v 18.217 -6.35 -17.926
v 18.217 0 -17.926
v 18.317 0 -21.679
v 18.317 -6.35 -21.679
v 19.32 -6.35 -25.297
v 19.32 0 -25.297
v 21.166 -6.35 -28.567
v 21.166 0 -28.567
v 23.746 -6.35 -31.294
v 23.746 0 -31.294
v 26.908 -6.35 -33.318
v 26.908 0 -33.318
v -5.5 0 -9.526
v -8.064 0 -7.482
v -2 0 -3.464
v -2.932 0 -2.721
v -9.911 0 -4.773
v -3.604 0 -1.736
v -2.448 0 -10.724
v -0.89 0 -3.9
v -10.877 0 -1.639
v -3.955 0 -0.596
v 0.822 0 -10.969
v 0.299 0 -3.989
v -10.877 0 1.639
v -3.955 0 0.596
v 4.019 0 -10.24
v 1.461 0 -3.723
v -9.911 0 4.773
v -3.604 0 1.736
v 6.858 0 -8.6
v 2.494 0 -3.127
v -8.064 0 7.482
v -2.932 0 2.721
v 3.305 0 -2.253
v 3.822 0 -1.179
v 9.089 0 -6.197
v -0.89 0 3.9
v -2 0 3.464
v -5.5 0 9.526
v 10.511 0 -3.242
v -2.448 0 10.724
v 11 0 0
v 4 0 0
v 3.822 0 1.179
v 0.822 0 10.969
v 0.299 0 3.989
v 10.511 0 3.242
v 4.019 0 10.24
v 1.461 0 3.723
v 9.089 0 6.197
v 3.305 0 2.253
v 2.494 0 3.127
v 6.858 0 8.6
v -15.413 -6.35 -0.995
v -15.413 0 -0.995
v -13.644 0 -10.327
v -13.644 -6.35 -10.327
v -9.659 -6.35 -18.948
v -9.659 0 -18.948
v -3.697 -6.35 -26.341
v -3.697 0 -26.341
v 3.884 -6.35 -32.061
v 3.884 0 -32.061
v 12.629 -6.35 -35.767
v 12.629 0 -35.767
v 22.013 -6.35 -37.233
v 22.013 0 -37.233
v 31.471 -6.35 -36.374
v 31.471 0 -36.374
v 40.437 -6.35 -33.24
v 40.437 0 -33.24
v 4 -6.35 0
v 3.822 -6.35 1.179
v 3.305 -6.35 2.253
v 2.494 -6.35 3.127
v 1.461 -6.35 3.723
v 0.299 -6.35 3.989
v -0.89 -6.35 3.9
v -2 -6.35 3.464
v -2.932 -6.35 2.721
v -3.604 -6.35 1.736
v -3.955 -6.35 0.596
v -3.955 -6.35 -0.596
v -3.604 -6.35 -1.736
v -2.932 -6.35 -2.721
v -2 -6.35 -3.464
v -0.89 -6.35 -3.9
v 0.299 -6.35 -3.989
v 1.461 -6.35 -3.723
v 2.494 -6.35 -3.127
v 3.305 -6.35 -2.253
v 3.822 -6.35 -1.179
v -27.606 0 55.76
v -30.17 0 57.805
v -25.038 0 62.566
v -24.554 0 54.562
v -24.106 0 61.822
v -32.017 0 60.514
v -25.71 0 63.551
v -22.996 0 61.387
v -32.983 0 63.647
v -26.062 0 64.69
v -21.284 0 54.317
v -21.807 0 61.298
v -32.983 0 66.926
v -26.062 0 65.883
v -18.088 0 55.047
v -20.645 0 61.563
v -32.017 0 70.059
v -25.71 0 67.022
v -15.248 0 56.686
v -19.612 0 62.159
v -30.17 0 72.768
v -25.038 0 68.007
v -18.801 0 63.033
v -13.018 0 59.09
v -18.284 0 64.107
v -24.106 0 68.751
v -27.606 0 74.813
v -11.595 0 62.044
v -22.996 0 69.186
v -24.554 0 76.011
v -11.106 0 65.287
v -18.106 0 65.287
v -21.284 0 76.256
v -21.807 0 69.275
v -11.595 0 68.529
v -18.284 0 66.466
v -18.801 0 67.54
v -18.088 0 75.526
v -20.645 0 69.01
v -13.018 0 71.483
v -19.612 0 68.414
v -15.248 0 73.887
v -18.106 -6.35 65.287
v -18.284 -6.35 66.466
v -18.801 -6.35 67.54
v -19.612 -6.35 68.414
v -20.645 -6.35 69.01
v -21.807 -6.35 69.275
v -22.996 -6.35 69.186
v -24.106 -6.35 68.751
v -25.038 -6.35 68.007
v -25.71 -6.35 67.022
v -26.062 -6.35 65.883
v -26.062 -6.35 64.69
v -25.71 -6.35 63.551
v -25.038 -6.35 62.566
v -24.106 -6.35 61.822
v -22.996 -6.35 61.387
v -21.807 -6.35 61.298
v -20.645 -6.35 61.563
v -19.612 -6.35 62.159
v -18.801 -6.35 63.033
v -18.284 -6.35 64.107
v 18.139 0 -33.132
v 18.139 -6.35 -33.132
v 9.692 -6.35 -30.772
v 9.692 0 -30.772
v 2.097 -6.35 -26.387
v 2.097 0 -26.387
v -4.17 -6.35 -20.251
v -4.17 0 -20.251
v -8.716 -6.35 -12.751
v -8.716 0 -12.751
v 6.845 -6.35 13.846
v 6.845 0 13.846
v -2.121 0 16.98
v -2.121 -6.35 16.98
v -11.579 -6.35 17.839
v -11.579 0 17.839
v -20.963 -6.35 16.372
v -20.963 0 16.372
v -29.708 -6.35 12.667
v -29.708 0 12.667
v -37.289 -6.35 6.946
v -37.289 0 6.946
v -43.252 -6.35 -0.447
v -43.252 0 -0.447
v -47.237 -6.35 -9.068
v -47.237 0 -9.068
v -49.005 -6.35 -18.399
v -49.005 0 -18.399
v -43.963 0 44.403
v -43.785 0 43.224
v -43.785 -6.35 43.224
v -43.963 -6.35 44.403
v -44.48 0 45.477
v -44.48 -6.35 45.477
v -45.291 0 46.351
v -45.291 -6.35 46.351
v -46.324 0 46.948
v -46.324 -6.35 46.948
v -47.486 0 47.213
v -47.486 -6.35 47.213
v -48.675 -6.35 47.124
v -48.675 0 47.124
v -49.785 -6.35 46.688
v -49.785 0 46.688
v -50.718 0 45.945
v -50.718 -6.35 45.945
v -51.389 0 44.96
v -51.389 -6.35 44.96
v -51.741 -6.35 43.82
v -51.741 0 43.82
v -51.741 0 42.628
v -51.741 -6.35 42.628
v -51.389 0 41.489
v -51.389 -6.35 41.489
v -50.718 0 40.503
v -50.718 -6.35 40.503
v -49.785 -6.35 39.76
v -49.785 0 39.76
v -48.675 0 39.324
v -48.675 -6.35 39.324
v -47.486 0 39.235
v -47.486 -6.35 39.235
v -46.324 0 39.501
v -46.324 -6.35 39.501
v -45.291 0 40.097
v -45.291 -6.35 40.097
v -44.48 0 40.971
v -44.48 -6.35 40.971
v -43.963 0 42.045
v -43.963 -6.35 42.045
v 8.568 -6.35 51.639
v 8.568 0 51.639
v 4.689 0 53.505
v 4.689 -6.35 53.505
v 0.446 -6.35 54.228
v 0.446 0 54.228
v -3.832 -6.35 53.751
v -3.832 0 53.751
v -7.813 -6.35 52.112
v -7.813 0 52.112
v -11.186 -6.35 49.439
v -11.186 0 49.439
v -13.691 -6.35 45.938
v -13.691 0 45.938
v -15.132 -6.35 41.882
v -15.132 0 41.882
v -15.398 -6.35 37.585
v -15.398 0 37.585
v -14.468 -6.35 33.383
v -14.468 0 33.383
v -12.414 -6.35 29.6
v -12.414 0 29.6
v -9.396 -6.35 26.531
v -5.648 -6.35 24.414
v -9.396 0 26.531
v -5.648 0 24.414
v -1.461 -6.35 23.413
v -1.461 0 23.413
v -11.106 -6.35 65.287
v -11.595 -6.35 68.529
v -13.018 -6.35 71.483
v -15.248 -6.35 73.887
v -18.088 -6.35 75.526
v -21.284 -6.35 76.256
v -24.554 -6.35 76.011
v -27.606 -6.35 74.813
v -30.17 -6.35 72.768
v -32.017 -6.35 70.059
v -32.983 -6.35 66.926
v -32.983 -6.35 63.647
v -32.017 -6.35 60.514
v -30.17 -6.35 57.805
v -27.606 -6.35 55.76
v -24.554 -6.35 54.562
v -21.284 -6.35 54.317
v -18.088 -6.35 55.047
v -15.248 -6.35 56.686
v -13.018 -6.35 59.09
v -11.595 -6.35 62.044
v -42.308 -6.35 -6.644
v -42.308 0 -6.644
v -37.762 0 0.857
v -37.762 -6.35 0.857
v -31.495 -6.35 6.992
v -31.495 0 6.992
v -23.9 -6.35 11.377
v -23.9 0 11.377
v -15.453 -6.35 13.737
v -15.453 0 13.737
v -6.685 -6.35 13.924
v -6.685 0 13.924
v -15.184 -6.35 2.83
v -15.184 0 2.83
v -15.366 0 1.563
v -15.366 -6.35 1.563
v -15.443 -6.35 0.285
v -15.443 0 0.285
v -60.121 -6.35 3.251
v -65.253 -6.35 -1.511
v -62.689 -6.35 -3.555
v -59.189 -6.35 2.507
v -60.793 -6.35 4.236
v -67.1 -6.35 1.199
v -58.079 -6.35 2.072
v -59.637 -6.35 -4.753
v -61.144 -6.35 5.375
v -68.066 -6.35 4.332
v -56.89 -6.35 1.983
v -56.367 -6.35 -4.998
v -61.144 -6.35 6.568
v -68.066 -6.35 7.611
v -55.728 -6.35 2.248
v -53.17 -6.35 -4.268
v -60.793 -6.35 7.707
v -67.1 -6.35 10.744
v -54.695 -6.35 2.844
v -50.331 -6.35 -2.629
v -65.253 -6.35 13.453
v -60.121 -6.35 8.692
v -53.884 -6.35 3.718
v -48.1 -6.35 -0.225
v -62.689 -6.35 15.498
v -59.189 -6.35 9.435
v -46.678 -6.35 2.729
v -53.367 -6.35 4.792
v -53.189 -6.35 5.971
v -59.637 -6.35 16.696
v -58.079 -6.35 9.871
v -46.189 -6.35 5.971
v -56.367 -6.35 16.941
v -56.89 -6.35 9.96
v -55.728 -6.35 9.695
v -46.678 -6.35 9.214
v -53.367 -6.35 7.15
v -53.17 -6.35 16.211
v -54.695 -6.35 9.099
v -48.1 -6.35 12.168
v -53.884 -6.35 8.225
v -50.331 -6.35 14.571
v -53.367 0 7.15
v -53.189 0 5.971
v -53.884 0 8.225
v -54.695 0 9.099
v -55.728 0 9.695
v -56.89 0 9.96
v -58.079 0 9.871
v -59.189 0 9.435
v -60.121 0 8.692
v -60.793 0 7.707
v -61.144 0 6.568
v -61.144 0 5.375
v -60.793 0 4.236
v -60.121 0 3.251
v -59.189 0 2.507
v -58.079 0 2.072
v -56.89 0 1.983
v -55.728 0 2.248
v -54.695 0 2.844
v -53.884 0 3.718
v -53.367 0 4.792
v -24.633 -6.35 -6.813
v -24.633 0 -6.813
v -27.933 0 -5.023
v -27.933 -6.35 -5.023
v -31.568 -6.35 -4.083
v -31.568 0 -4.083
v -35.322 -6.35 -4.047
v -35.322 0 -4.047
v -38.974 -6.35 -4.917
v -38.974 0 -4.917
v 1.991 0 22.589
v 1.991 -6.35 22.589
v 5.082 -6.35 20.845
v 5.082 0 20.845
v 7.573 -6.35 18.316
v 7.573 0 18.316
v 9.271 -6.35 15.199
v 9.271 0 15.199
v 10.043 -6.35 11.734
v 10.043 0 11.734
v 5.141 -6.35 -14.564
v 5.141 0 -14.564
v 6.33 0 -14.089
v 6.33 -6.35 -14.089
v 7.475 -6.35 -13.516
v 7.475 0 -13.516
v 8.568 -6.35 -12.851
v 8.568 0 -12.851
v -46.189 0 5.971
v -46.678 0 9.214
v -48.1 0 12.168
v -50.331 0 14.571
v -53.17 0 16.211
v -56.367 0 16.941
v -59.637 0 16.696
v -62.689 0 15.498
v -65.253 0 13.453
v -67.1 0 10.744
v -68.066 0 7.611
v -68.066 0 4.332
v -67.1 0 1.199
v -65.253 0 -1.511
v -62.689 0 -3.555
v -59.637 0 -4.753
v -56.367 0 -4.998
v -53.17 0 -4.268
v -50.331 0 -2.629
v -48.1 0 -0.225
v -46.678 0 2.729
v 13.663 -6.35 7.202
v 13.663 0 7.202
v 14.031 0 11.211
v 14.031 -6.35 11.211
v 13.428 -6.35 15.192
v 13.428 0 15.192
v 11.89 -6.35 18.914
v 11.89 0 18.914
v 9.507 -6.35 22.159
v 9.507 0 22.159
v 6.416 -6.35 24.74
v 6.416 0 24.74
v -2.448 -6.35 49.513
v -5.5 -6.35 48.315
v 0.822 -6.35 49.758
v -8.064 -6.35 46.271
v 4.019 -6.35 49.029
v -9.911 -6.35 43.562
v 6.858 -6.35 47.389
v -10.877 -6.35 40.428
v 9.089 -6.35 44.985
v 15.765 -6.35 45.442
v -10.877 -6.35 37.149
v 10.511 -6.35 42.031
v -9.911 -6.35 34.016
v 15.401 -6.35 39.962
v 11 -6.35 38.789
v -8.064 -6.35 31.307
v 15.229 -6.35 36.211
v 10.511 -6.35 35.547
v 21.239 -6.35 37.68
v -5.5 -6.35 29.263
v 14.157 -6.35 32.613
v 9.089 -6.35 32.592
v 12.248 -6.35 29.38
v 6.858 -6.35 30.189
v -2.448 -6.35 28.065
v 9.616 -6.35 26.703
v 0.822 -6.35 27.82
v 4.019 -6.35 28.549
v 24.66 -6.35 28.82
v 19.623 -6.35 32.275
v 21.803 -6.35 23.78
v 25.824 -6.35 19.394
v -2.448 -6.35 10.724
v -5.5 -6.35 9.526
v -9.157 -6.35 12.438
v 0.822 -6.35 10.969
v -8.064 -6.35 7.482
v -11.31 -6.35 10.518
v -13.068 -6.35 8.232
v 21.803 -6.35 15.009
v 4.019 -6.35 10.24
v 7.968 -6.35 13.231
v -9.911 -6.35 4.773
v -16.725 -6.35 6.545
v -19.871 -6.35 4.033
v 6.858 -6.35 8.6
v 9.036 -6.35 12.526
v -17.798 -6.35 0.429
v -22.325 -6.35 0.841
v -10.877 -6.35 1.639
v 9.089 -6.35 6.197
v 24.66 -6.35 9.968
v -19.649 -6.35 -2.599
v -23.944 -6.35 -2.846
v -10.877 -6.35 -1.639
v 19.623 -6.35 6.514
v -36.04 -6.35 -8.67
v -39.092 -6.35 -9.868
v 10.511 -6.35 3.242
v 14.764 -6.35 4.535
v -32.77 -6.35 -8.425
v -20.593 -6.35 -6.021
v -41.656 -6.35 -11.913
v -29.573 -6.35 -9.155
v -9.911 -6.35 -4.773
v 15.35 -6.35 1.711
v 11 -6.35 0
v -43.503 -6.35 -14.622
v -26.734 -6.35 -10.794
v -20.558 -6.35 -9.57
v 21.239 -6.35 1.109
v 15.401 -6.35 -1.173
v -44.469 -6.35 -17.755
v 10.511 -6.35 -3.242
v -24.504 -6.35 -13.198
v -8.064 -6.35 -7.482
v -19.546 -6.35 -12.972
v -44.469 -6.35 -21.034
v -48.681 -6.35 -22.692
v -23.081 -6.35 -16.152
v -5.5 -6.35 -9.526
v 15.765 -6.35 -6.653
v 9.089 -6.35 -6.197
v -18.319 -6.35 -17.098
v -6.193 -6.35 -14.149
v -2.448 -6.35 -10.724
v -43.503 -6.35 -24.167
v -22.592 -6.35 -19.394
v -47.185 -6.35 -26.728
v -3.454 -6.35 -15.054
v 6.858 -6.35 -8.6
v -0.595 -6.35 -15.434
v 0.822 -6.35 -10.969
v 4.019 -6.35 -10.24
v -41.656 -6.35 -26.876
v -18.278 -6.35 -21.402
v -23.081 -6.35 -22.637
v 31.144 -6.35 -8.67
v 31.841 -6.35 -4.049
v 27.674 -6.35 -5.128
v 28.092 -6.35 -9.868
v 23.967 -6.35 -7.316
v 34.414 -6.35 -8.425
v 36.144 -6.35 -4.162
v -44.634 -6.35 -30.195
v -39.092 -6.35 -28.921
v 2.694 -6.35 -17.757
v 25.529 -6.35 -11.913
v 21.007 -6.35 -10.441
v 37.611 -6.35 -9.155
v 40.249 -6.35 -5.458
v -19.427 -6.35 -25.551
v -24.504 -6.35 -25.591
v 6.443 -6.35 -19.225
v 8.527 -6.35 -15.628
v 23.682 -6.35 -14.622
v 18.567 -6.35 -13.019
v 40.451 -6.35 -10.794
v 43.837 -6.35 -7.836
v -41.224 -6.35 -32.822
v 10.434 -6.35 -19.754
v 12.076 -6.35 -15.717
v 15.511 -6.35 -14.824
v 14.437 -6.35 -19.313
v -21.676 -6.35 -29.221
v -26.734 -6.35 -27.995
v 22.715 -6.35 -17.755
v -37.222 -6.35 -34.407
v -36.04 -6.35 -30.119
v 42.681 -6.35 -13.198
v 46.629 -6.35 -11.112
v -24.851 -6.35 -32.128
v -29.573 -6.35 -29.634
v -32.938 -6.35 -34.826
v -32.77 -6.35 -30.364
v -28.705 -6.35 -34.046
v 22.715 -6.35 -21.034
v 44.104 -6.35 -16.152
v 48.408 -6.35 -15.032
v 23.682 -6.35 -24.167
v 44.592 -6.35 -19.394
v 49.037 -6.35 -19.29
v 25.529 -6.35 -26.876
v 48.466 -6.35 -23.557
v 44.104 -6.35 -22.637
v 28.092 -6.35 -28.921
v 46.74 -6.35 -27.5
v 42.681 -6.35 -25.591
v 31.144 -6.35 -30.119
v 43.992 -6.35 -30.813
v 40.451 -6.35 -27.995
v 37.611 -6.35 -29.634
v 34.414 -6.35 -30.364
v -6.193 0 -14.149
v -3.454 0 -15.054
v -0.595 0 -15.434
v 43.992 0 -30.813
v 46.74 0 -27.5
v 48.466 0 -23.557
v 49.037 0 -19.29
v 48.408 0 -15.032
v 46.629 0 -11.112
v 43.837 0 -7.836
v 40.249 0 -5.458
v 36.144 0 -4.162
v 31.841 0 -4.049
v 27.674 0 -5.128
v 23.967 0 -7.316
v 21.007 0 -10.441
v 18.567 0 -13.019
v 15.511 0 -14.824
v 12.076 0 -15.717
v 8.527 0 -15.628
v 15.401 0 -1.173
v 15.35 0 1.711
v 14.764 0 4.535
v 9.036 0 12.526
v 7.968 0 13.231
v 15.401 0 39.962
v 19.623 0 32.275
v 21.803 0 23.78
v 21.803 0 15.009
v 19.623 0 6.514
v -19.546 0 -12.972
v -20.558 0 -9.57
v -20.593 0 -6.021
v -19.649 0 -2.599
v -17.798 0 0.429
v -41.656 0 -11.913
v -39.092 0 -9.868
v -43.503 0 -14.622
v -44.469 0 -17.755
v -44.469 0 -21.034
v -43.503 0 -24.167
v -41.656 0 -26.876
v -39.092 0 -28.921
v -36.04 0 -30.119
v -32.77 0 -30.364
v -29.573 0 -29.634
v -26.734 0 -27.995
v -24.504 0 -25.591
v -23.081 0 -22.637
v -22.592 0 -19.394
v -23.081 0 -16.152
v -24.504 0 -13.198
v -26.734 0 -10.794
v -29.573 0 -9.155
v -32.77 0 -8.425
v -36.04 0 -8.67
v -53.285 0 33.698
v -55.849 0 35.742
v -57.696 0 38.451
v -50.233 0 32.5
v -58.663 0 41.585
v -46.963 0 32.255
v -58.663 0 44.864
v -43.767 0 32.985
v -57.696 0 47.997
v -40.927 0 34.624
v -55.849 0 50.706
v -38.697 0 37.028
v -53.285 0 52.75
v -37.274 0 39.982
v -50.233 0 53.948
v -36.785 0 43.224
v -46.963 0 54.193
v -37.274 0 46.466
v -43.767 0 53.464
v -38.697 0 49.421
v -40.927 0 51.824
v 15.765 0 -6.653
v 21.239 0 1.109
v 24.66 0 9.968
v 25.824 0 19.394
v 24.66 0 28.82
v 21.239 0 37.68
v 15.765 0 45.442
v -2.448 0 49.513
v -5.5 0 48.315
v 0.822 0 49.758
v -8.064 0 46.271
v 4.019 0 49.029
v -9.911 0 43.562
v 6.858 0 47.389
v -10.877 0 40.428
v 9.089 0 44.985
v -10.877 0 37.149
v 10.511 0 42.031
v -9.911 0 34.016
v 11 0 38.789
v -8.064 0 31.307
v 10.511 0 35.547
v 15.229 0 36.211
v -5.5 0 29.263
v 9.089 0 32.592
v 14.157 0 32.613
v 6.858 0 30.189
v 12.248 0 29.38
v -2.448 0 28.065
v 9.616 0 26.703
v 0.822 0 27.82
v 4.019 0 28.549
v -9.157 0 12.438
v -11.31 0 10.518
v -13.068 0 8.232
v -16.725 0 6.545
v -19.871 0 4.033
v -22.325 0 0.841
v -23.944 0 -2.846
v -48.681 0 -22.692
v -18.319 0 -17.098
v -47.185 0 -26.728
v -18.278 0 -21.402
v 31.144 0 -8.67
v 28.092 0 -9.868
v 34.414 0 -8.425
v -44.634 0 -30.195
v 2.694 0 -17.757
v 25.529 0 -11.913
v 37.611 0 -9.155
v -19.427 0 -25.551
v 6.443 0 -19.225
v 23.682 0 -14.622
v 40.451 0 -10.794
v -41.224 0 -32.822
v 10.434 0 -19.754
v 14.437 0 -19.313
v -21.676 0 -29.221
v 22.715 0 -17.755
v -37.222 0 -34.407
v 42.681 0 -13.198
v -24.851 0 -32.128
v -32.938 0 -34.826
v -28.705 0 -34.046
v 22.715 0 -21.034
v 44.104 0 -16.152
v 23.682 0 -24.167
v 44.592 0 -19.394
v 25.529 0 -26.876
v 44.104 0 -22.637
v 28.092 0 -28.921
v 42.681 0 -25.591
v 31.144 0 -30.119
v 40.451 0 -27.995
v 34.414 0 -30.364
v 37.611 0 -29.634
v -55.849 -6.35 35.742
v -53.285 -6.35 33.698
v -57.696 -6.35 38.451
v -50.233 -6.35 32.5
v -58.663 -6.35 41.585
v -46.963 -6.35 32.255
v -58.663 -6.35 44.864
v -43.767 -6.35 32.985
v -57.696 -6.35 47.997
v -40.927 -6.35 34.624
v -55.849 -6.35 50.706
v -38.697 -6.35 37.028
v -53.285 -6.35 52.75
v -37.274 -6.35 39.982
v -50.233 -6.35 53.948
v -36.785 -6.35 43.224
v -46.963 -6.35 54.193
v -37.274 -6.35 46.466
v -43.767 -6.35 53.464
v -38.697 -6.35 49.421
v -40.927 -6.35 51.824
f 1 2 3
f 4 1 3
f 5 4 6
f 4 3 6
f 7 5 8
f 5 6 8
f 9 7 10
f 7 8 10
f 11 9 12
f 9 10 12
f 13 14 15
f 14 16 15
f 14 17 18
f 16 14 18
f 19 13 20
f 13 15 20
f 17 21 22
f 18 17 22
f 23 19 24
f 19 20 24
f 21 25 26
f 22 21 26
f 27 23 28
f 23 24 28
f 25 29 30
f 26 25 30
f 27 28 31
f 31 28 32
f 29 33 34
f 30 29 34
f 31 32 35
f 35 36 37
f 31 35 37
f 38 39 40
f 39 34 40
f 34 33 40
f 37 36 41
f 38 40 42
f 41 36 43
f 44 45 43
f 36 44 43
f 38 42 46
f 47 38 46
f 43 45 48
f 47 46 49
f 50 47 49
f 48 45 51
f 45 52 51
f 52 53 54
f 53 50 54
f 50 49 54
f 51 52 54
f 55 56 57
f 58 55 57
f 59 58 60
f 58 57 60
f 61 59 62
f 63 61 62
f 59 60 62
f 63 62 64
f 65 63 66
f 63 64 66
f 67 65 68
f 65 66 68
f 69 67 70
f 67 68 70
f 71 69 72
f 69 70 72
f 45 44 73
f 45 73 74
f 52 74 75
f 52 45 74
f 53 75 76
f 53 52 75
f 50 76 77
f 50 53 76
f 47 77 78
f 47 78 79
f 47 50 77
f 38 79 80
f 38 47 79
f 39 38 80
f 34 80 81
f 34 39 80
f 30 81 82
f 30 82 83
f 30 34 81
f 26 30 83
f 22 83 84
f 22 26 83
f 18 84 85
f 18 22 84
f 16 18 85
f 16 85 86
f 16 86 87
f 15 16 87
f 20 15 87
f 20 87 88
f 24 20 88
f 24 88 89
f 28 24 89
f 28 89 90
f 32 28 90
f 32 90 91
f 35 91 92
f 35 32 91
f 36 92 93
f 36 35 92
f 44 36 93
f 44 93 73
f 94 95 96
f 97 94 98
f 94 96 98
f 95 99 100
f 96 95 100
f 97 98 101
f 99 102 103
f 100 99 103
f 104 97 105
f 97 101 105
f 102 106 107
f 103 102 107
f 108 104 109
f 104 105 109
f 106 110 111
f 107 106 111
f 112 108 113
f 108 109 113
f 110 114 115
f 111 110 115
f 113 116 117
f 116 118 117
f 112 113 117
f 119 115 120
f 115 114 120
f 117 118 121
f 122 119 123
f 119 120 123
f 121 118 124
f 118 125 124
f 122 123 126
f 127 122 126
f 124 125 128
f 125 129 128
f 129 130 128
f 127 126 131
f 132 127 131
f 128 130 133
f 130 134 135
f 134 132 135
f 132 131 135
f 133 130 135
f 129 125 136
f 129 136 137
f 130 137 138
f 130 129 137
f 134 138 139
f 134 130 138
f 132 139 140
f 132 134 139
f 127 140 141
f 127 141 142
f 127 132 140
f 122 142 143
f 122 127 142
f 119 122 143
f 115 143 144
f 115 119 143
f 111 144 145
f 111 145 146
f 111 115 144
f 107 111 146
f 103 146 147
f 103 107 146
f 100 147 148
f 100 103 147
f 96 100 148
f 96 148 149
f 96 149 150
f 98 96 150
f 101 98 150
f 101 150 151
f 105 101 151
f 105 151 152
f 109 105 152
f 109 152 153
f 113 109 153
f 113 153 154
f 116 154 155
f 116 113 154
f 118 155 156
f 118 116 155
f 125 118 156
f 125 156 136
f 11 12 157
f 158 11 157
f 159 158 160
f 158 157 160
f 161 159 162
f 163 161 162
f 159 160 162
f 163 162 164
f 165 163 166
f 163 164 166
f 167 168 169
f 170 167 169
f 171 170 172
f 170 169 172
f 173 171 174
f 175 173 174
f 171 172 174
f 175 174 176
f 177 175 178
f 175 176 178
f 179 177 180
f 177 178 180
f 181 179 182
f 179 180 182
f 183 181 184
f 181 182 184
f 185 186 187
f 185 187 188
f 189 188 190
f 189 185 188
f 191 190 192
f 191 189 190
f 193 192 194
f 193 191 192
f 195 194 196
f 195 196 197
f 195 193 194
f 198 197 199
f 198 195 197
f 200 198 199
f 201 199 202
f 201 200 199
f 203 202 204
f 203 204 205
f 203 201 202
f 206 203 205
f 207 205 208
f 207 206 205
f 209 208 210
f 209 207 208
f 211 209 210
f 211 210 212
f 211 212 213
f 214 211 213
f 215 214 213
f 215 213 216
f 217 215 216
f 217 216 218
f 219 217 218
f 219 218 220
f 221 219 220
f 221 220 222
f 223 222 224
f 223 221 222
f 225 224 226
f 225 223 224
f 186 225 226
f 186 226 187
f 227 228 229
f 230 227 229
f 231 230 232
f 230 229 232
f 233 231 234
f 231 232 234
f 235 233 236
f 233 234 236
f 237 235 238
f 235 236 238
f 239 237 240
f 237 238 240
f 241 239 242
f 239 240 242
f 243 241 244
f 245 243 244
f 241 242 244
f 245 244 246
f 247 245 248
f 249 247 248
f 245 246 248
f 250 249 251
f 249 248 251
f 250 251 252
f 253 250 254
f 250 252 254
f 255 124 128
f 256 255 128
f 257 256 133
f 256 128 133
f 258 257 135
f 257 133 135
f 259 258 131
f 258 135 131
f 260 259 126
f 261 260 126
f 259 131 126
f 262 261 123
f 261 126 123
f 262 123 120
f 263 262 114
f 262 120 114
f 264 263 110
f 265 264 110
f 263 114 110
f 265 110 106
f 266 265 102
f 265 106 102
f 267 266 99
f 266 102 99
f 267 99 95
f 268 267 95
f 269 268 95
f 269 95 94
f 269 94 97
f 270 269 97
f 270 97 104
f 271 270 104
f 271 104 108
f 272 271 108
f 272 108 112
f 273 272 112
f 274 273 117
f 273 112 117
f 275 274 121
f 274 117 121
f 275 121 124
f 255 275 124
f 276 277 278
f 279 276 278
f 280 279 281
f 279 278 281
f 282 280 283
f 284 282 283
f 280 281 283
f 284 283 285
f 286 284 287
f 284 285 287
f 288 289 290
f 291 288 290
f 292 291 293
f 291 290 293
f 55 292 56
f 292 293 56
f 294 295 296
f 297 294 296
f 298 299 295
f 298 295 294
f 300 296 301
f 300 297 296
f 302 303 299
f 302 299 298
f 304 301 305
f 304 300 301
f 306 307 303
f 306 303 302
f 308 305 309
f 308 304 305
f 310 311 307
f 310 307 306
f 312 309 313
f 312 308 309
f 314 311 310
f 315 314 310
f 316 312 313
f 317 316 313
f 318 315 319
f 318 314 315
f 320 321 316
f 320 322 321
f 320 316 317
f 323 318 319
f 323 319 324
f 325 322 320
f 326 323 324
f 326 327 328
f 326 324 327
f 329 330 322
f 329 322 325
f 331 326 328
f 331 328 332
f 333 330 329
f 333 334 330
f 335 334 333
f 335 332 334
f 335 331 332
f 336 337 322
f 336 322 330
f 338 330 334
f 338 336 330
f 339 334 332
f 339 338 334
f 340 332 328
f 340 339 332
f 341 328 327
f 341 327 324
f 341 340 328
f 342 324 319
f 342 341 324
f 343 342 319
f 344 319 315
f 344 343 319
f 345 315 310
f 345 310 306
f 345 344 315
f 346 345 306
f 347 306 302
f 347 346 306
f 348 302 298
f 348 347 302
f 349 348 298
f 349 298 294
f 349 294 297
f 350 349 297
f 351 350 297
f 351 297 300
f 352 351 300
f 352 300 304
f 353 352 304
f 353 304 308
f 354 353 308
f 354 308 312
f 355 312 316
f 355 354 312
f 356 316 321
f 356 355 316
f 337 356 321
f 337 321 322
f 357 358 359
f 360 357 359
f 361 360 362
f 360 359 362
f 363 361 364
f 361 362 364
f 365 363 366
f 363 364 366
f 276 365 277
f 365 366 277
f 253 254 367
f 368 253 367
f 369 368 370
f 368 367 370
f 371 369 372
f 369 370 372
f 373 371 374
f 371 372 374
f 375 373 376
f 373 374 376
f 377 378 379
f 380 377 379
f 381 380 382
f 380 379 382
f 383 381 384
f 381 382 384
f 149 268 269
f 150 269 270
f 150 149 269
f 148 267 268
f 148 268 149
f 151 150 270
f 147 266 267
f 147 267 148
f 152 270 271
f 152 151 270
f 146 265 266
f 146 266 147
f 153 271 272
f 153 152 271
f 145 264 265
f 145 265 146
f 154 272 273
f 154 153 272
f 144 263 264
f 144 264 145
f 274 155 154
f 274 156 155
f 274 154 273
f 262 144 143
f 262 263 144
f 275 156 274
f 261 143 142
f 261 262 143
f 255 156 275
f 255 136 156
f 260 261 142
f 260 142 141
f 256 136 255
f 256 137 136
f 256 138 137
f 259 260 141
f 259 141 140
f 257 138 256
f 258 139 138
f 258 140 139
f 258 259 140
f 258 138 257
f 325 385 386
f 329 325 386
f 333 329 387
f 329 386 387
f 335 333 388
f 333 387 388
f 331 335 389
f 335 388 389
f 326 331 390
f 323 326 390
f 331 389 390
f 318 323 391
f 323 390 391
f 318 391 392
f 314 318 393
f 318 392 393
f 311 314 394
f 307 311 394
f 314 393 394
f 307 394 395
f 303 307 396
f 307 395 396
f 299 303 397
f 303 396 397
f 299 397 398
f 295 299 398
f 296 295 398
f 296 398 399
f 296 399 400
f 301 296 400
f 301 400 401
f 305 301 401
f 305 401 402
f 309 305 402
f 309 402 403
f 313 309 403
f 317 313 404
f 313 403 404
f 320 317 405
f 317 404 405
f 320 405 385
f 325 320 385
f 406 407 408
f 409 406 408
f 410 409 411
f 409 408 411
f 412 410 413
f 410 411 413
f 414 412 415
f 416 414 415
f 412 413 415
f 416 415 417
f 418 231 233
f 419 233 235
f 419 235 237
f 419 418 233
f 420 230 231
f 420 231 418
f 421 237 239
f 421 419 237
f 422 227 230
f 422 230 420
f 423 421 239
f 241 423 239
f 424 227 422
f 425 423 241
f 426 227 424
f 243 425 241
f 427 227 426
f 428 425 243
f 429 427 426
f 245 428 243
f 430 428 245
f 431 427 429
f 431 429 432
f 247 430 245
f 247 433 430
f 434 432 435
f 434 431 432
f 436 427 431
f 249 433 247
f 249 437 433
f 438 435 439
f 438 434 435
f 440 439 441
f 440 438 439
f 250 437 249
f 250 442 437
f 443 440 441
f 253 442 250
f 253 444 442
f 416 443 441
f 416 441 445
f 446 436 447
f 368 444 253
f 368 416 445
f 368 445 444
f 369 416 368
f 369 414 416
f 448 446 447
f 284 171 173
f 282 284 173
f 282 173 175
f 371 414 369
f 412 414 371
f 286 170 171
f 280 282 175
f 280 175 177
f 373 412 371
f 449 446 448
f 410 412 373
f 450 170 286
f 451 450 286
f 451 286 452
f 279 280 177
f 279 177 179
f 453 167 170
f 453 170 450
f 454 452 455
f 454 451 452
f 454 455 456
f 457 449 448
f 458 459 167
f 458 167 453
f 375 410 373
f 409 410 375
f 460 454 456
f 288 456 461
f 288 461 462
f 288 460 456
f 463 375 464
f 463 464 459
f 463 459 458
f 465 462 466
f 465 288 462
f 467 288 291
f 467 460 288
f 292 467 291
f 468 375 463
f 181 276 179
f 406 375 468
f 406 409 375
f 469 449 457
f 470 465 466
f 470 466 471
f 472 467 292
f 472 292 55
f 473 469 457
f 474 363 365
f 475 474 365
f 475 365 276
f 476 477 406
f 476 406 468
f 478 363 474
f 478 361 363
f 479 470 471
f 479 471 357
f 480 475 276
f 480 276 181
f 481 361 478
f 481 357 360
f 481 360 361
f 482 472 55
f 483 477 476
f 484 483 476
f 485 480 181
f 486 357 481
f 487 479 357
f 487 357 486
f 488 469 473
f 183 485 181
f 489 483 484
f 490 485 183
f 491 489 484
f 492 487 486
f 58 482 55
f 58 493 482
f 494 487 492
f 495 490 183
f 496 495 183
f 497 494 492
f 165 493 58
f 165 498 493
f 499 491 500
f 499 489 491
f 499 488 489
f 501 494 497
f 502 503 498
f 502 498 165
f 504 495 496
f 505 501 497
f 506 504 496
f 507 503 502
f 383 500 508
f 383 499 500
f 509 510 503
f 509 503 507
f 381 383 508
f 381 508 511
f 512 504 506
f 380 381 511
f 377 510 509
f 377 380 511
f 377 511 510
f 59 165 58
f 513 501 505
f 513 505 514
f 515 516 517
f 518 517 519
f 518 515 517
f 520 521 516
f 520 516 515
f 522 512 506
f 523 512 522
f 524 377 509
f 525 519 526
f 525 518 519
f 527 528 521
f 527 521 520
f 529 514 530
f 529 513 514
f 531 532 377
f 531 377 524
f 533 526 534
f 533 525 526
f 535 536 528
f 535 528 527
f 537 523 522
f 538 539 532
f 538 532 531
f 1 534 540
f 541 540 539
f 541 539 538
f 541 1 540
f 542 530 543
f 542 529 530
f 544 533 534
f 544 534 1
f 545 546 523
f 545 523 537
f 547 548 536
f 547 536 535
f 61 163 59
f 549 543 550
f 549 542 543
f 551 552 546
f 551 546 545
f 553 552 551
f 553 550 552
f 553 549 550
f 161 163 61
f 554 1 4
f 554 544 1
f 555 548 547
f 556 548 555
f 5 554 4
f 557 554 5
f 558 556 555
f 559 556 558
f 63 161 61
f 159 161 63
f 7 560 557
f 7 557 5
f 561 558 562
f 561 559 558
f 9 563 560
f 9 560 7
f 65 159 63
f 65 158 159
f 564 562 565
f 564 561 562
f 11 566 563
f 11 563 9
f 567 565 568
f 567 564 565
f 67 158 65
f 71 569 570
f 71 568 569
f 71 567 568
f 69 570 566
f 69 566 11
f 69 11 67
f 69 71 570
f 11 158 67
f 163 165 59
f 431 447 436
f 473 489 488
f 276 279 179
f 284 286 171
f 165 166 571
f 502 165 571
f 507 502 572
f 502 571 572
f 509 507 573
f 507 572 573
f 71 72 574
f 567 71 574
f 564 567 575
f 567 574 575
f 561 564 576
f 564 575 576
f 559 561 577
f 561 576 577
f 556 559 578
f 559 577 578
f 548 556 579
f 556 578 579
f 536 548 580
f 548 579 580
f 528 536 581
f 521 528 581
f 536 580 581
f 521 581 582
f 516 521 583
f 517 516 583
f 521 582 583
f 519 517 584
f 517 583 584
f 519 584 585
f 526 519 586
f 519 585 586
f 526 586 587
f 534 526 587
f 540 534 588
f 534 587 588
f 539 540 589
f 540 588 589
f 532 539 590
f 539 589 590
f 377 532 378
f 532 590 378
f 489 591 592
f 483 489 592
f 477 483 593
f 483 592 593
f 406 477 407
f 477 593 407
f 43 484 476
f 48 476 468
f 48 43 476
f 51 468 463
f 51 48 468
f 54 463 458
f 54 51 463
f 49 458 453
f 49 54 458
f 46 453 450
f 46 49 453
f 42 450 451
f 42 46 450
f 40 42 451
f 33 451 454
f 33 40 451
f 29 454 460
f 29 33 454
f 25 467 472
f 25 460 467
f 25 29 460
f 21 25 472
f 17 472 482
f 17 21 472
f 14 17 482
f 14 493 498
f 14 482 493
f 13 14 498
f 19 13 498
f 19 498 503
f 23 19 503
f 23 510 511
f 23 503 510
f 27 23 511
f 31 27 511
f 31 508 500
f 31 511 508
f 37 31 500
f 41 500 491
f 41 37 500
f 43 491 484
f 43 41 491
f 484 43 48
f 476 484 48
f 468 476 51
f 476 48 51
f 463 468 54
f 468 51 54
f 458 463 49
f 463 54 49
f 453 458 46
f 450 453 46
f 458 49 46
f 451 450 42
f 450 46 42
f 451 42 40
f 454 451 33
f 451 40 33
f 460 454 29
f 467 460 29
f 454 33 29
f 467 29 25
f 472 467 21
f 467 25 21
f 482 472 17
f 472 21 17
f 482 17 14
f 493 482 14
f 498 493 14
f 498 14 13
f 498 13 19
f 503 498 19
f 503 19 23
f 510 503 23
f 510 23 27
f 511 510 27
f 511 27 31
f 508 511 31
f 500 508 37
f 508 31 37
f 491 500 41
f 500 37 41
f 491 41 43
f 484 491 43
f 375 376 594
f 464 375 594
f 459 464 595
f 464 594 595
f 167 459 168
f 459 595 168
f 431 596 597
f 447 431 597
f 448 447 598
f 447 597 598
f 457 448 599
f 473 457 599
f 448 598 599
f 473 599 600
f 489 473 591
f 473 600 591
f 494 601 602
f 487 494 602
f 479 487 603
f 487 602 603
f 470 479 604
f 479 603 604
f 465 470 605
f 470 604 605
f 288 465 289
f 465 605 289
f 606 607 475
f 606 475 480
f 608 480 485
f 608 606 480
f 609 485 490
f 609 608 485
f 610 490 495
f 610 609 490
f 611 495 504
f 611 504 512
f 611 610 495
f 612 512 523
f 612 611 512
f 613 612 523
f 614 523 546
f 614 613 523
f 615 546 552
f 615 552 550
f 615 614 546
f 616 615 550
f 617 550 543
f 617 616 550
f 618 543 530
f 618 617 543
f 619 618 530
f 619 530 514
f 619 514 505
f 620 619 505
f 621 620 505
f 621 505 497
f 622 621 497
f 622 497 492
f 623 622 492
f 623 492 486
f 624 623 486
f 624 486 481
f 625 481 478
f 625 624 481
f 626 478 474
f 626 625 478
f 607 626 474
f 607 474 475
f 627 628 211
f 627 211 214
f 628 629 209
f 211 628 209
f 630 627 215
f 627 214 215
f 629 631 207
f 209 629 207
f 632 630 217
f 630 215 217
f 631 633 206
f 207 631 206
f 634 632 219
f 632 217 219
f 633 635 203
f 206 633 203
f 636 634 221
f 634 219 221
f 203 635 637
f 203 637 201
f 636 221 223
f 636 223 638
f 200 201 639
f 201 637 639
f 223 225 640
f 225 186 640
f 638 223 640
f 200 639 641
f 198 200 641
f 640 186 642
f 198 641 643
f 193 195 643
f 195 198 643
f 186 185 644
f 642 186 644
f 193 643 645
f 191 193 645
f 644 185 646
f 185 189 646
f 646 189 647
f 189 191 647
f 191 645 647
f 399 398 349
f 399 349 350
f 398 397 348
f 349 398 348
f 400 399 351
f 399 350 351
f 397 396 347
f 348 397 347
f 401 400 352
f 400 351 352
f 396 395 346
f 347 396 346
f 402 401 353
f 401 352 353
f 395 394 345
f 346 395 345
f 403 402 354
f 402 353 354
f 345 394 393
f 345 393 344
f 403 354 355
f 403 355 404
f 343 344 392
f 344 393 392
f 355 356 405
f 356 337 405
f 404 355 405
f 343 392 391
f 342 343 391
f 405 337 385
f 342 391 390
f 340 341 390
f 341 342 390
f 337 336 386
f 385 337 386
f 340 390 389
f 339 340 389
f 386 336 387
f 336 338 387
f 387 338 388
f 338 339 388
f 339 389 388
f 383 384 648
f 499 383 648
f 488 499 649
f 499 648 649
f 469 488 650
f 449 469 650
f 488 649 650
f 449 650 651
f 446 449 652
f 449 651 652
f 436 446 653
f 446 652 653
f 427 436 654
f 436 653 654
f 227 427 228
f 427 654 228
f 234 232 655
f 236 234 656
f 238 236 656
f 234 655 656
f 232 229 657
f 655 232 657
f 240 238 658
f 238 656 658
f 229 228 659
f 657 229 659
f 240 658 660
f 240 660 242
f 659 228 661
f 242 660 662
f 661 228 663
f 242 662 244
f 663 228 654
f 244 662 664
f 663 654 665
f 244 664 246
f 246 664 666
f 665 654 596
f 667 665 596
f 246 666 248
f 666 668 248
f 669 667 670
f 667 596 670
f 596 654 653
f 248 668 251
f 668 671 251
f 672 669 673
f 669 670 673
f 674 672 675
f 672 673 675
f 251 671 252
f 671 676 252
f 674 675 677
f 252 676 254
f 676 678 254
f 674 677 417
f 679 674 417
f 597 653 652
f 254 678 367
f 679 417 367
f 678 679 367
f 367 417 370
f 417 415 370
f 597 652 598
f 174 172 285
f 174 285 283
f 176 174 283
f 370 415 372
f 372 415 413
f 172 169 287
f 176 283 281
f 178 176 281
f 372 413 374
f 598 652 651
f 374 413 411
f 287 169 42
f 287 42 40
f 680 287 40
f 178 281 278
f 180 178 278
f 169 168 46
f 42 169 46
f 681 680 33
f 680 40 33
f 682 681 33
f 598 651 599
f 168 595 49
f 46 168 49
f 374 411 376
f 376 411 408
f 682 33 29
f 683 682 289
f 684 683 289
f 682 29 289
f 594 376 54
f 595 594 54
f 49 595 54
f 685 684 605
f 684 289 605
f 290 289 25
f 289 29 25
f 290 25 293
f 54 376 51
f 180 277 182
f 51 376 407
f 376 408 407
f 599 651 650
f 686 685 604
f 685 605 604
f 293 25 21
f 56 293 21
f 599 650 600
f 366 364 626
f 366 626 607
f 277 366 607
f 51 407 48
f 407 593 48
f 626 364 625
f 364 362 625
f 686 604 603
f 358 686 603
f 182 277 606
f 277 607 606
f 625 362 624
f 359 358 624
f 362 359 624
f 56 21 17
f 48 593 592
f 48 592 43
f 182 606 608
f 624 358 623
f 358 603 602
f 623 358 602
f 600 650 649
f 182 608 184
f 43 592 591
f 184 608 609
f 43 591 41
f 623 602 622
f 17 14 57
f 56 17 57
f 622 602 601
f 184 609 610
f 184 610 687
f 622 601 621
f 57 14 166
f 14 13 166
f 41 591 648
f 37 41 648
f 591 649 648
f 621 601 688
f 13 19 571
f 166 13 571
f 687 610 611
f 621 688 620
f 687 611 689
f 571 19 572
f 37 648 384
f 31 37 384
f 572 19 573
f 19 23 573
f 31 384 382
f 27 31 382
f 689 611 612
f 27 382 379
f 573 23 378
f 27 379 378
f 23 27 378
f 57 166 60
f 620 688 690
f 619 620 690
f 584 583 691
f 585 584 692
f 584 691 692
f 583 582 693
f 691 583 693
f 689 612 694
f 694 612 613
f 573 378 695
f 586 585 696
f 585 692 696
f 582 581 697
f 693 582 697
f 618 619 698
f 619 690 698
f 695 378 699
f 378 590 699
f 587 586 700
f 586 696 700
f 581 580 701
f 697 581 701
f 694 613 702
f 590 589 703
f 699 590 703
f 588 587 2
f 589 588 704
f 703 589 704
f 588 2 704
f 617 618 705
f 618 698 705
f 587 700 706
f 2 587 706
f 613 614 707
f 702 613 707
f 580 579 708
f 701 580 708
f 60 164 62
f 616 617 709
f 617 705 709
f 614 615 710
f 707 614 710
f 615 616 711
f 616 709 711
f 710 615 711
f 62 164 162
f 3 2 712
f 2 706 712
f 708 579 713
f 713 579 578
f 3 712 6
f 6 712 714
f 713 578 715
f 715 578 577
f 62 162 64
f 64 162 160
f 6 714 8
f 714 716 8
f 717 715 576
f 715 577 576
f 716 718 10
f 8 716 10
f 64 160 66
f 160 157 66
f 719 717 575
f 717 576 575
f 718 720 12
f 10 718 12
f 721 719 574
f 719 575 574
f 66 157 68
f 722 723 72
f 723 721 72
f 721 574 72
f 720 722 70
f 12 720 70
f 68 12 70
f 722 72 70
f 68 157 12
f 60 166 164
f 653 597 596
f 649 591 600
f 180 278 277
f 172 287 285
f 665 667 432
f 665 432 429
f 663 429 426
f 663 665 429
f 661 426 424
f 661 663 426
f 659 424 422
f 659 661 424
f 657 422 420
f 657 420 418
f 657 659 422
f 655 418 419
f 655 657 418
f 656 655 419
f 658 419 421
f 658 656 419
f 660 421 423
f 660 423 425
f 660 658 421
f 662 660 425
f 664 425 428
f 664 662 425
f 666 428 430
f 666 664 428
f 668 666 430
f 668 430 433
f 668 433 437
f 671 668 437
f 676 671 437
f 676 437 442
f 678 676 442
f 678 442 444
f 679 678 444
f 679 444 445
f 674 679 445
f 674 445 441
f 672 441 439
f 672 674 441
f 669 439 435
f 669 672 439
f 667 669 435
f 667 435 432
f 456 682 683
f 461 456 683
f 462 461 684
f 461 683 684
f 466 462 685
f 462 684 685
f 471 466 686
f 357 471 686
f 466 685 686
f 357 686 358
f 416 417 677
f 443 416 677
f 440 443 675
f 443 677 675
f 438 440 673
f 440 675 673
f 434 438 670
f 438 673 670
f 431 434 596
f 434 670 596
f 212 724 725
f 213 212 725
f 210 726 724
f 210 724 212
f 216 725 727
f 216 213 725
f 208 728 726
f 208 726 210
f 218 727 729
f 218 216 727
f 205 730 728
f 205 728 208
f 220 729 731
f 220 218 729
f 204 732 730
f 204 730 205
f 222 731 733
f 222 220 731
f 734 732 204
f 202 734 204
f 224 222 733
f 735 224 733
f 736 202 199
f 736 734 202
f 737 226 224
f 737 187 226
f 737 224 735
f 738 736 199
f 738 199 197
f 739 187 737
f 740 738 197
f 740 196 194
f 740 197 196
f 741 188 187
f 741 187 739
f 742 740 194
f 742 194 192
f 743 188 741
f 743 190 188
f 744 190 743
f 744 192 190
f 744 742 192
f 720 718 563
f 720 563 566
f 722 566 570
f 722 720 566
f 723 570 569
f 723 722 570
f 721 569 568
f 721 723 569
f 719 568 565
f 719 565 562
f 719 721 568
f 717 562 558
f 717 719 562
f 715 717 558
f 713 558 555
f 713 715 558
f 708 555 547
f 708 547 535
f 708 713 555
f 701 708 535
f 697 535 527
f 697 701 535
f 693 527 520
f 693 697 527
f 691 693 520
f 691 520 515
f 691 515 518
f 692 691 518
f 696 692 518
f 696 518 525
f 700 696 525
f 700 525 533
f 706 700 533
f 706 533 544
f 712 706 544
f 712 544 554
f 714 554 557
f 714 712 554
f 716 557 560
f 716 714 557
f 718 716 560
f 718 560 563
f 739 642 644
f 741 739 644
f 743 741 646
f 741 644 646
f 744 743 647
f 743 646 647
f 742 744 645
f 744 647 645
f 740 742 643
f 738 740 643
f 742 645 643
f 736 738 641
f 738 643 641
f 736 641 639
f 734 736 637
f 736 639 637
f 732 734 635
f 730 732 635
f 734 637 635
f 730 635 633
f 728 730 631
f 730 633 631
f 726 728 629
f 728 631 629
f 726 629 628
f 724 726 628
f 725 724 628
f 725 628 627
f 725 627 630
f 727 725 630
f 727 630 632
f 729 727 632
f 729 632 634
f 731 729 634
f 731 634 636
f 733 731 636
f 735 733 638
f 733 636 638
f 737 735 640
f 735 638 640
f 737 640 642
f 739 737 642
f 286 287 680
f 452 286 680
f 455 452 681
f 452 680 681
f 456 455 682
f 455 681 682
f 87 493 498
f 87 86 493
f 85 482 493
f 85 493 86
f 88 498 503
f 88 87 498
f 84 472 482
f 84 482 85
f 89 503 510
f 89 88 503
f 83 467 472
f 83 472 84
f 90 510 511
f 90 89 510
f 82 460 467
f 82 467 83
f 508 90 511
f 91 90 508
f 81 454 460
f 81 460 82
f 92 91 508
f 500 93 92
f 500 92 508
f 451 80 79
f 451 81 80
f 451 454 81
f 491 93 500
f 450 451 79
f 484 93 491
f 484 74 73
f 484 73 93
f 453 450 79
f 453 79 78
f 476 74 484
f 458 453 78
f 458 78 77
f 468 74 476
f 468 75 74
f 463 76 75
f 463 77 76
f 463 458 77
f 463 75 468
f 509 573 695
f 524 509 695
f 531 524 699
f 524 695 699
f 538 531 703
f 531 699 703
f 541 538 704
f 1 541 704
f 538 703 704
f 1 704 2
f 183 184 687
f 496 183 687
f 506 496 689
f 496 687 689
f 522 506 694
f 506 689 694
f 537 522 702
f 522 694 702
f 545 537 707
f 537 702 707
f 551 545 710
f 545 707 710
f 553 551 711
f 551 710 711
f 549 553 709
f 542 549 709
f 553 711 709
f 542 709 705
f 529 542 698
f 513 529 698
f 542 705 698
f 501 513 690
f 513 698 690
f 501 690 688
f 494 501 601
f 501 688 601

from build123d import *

# Parameters (mm, degrees)
F1_R     = 11
F2_DEPTH = 6.35
F3_COUNT = 3
F1_R_2   = 4
F4_DEPTH = 6.35
F5_R     = 11
F5_R_2   = 4
F6_DEPTH = 6.35
F7_DEPTH = 6.35
F8_DEPTH = 6.35


with BuildPart() as f2:
    # F1 (on Front) → F2 (new body)
    with BuildSketch(Plane.XZ):
        with BuildLine():
            ThreePointArc((-1.4612667351, 23.4131014427), (6.4162478072, 19.6674691464), (10.0427237927, 11.7343947997))
            ThreePointArc((10.0427237927, 11.7343947997), (-15.4174391876, 0.9246033691), (8.5683350764, -12.850523589))
            ThreePointArc((8.5683350764, -12.850523589), (25.8238631569, 19.3944799292), (8.5683350764, 51.6394834474))
            ThreePointArc((8.5683350764, 51.6394834474), (-14.5536856284, 43.9602804945), (-1.4612667351, 23.4131014427))
        make_face()
        Circle(F1_R, mode=Mode.SUBTRACT)
        with Locations((0, 38.7889598584)):
            Circle(F1_R, mode=Mode.SUBTRACT)
        with BuildLine():
            ThreePointArc((13.6634637034, 7.2015333173), (12.7718103509, 17.0994927213), (6.4162478072, 24.7396151559))
            ThreePointArc((6.4162478072, 24.7396151559), (13.3011693847, 30.9384047512), (15.4005525832, 39.9616928305))
            ThreePointArc((15.4005525832, 39.9616928305), (22.0786916612, 19.3944799292), (15.4005525832, -1.1727329721))
            ThreePointArc((15.4005525832, -1.1727329721), (15.1232055017, 3.1370332871), (13.6634637034, 7.2015333173))
        make_face(mode=Mode.SUBTRACT)
    extrude(amount=F2_DEPTH)

    # F3: F2 ×3 about axis
    f3_axis = Axis((0, -6.35, 0), (0, -1, 0))


with BuildPart() as f2_1:
    add(f2.part)
    for i in range(1, F3_COUNT):
        add(f2.part.rotate(f3_axis, i * 360 / F3_COUNT))


with BuildPart() as f4:
    # F1 (on Front) → F4 (new body)
    with BuildSketch(Plane.XZ):
        Circle(F1_R)
        Circle(F1_R_2, mode=Mode.SUBTRACT)
    extrude(amount=F4_DEPTH)


with BuildPart() as f6:
    # F5 (on Front) → F6 (new body)
    with BuildSketch(Plane.XZ):
        with Locations((-22.1062817913, 65.2865074809)):
            Circle(F5_R)
        with Locations((-22.1062817913, 65.2865074809)):
            Circle(F5_R_2, mode=Mode.SUBTRACT)
    extrude(amount=F6_DEPTH)


with BuildPart() as f7:
    # F5 (on Front) → F7 (new body)
    with BuildSketch(Plane.XZ):
        with Locations((-47.7854066729, 43.2241640761)):
            Circle(F5_R)
        with Locations((-47.7854066729, 43.2241640761)):
            Circle(F5_R_2, mode=Mode.SUBTRACT)
    extrude(amount=F7_DEPTH)


with BuildPart() as f8:
    # F5 (on Front) → F8 (new body)
    with BuildSketch(Plane.XZ):
        with Locations((-57.1890292476, 5.9713492778)):
            Circle(F5_R)
        with Locations((-57.1890292476, 5.9713492778)):
            Circle(F5_R_2, mode=Mode.SUBTRACT)
    extrude(amount=F8_DEPTH)


solid = Compound([f2_1.part, f4.part, f6.part, f7.part, f8.part])
